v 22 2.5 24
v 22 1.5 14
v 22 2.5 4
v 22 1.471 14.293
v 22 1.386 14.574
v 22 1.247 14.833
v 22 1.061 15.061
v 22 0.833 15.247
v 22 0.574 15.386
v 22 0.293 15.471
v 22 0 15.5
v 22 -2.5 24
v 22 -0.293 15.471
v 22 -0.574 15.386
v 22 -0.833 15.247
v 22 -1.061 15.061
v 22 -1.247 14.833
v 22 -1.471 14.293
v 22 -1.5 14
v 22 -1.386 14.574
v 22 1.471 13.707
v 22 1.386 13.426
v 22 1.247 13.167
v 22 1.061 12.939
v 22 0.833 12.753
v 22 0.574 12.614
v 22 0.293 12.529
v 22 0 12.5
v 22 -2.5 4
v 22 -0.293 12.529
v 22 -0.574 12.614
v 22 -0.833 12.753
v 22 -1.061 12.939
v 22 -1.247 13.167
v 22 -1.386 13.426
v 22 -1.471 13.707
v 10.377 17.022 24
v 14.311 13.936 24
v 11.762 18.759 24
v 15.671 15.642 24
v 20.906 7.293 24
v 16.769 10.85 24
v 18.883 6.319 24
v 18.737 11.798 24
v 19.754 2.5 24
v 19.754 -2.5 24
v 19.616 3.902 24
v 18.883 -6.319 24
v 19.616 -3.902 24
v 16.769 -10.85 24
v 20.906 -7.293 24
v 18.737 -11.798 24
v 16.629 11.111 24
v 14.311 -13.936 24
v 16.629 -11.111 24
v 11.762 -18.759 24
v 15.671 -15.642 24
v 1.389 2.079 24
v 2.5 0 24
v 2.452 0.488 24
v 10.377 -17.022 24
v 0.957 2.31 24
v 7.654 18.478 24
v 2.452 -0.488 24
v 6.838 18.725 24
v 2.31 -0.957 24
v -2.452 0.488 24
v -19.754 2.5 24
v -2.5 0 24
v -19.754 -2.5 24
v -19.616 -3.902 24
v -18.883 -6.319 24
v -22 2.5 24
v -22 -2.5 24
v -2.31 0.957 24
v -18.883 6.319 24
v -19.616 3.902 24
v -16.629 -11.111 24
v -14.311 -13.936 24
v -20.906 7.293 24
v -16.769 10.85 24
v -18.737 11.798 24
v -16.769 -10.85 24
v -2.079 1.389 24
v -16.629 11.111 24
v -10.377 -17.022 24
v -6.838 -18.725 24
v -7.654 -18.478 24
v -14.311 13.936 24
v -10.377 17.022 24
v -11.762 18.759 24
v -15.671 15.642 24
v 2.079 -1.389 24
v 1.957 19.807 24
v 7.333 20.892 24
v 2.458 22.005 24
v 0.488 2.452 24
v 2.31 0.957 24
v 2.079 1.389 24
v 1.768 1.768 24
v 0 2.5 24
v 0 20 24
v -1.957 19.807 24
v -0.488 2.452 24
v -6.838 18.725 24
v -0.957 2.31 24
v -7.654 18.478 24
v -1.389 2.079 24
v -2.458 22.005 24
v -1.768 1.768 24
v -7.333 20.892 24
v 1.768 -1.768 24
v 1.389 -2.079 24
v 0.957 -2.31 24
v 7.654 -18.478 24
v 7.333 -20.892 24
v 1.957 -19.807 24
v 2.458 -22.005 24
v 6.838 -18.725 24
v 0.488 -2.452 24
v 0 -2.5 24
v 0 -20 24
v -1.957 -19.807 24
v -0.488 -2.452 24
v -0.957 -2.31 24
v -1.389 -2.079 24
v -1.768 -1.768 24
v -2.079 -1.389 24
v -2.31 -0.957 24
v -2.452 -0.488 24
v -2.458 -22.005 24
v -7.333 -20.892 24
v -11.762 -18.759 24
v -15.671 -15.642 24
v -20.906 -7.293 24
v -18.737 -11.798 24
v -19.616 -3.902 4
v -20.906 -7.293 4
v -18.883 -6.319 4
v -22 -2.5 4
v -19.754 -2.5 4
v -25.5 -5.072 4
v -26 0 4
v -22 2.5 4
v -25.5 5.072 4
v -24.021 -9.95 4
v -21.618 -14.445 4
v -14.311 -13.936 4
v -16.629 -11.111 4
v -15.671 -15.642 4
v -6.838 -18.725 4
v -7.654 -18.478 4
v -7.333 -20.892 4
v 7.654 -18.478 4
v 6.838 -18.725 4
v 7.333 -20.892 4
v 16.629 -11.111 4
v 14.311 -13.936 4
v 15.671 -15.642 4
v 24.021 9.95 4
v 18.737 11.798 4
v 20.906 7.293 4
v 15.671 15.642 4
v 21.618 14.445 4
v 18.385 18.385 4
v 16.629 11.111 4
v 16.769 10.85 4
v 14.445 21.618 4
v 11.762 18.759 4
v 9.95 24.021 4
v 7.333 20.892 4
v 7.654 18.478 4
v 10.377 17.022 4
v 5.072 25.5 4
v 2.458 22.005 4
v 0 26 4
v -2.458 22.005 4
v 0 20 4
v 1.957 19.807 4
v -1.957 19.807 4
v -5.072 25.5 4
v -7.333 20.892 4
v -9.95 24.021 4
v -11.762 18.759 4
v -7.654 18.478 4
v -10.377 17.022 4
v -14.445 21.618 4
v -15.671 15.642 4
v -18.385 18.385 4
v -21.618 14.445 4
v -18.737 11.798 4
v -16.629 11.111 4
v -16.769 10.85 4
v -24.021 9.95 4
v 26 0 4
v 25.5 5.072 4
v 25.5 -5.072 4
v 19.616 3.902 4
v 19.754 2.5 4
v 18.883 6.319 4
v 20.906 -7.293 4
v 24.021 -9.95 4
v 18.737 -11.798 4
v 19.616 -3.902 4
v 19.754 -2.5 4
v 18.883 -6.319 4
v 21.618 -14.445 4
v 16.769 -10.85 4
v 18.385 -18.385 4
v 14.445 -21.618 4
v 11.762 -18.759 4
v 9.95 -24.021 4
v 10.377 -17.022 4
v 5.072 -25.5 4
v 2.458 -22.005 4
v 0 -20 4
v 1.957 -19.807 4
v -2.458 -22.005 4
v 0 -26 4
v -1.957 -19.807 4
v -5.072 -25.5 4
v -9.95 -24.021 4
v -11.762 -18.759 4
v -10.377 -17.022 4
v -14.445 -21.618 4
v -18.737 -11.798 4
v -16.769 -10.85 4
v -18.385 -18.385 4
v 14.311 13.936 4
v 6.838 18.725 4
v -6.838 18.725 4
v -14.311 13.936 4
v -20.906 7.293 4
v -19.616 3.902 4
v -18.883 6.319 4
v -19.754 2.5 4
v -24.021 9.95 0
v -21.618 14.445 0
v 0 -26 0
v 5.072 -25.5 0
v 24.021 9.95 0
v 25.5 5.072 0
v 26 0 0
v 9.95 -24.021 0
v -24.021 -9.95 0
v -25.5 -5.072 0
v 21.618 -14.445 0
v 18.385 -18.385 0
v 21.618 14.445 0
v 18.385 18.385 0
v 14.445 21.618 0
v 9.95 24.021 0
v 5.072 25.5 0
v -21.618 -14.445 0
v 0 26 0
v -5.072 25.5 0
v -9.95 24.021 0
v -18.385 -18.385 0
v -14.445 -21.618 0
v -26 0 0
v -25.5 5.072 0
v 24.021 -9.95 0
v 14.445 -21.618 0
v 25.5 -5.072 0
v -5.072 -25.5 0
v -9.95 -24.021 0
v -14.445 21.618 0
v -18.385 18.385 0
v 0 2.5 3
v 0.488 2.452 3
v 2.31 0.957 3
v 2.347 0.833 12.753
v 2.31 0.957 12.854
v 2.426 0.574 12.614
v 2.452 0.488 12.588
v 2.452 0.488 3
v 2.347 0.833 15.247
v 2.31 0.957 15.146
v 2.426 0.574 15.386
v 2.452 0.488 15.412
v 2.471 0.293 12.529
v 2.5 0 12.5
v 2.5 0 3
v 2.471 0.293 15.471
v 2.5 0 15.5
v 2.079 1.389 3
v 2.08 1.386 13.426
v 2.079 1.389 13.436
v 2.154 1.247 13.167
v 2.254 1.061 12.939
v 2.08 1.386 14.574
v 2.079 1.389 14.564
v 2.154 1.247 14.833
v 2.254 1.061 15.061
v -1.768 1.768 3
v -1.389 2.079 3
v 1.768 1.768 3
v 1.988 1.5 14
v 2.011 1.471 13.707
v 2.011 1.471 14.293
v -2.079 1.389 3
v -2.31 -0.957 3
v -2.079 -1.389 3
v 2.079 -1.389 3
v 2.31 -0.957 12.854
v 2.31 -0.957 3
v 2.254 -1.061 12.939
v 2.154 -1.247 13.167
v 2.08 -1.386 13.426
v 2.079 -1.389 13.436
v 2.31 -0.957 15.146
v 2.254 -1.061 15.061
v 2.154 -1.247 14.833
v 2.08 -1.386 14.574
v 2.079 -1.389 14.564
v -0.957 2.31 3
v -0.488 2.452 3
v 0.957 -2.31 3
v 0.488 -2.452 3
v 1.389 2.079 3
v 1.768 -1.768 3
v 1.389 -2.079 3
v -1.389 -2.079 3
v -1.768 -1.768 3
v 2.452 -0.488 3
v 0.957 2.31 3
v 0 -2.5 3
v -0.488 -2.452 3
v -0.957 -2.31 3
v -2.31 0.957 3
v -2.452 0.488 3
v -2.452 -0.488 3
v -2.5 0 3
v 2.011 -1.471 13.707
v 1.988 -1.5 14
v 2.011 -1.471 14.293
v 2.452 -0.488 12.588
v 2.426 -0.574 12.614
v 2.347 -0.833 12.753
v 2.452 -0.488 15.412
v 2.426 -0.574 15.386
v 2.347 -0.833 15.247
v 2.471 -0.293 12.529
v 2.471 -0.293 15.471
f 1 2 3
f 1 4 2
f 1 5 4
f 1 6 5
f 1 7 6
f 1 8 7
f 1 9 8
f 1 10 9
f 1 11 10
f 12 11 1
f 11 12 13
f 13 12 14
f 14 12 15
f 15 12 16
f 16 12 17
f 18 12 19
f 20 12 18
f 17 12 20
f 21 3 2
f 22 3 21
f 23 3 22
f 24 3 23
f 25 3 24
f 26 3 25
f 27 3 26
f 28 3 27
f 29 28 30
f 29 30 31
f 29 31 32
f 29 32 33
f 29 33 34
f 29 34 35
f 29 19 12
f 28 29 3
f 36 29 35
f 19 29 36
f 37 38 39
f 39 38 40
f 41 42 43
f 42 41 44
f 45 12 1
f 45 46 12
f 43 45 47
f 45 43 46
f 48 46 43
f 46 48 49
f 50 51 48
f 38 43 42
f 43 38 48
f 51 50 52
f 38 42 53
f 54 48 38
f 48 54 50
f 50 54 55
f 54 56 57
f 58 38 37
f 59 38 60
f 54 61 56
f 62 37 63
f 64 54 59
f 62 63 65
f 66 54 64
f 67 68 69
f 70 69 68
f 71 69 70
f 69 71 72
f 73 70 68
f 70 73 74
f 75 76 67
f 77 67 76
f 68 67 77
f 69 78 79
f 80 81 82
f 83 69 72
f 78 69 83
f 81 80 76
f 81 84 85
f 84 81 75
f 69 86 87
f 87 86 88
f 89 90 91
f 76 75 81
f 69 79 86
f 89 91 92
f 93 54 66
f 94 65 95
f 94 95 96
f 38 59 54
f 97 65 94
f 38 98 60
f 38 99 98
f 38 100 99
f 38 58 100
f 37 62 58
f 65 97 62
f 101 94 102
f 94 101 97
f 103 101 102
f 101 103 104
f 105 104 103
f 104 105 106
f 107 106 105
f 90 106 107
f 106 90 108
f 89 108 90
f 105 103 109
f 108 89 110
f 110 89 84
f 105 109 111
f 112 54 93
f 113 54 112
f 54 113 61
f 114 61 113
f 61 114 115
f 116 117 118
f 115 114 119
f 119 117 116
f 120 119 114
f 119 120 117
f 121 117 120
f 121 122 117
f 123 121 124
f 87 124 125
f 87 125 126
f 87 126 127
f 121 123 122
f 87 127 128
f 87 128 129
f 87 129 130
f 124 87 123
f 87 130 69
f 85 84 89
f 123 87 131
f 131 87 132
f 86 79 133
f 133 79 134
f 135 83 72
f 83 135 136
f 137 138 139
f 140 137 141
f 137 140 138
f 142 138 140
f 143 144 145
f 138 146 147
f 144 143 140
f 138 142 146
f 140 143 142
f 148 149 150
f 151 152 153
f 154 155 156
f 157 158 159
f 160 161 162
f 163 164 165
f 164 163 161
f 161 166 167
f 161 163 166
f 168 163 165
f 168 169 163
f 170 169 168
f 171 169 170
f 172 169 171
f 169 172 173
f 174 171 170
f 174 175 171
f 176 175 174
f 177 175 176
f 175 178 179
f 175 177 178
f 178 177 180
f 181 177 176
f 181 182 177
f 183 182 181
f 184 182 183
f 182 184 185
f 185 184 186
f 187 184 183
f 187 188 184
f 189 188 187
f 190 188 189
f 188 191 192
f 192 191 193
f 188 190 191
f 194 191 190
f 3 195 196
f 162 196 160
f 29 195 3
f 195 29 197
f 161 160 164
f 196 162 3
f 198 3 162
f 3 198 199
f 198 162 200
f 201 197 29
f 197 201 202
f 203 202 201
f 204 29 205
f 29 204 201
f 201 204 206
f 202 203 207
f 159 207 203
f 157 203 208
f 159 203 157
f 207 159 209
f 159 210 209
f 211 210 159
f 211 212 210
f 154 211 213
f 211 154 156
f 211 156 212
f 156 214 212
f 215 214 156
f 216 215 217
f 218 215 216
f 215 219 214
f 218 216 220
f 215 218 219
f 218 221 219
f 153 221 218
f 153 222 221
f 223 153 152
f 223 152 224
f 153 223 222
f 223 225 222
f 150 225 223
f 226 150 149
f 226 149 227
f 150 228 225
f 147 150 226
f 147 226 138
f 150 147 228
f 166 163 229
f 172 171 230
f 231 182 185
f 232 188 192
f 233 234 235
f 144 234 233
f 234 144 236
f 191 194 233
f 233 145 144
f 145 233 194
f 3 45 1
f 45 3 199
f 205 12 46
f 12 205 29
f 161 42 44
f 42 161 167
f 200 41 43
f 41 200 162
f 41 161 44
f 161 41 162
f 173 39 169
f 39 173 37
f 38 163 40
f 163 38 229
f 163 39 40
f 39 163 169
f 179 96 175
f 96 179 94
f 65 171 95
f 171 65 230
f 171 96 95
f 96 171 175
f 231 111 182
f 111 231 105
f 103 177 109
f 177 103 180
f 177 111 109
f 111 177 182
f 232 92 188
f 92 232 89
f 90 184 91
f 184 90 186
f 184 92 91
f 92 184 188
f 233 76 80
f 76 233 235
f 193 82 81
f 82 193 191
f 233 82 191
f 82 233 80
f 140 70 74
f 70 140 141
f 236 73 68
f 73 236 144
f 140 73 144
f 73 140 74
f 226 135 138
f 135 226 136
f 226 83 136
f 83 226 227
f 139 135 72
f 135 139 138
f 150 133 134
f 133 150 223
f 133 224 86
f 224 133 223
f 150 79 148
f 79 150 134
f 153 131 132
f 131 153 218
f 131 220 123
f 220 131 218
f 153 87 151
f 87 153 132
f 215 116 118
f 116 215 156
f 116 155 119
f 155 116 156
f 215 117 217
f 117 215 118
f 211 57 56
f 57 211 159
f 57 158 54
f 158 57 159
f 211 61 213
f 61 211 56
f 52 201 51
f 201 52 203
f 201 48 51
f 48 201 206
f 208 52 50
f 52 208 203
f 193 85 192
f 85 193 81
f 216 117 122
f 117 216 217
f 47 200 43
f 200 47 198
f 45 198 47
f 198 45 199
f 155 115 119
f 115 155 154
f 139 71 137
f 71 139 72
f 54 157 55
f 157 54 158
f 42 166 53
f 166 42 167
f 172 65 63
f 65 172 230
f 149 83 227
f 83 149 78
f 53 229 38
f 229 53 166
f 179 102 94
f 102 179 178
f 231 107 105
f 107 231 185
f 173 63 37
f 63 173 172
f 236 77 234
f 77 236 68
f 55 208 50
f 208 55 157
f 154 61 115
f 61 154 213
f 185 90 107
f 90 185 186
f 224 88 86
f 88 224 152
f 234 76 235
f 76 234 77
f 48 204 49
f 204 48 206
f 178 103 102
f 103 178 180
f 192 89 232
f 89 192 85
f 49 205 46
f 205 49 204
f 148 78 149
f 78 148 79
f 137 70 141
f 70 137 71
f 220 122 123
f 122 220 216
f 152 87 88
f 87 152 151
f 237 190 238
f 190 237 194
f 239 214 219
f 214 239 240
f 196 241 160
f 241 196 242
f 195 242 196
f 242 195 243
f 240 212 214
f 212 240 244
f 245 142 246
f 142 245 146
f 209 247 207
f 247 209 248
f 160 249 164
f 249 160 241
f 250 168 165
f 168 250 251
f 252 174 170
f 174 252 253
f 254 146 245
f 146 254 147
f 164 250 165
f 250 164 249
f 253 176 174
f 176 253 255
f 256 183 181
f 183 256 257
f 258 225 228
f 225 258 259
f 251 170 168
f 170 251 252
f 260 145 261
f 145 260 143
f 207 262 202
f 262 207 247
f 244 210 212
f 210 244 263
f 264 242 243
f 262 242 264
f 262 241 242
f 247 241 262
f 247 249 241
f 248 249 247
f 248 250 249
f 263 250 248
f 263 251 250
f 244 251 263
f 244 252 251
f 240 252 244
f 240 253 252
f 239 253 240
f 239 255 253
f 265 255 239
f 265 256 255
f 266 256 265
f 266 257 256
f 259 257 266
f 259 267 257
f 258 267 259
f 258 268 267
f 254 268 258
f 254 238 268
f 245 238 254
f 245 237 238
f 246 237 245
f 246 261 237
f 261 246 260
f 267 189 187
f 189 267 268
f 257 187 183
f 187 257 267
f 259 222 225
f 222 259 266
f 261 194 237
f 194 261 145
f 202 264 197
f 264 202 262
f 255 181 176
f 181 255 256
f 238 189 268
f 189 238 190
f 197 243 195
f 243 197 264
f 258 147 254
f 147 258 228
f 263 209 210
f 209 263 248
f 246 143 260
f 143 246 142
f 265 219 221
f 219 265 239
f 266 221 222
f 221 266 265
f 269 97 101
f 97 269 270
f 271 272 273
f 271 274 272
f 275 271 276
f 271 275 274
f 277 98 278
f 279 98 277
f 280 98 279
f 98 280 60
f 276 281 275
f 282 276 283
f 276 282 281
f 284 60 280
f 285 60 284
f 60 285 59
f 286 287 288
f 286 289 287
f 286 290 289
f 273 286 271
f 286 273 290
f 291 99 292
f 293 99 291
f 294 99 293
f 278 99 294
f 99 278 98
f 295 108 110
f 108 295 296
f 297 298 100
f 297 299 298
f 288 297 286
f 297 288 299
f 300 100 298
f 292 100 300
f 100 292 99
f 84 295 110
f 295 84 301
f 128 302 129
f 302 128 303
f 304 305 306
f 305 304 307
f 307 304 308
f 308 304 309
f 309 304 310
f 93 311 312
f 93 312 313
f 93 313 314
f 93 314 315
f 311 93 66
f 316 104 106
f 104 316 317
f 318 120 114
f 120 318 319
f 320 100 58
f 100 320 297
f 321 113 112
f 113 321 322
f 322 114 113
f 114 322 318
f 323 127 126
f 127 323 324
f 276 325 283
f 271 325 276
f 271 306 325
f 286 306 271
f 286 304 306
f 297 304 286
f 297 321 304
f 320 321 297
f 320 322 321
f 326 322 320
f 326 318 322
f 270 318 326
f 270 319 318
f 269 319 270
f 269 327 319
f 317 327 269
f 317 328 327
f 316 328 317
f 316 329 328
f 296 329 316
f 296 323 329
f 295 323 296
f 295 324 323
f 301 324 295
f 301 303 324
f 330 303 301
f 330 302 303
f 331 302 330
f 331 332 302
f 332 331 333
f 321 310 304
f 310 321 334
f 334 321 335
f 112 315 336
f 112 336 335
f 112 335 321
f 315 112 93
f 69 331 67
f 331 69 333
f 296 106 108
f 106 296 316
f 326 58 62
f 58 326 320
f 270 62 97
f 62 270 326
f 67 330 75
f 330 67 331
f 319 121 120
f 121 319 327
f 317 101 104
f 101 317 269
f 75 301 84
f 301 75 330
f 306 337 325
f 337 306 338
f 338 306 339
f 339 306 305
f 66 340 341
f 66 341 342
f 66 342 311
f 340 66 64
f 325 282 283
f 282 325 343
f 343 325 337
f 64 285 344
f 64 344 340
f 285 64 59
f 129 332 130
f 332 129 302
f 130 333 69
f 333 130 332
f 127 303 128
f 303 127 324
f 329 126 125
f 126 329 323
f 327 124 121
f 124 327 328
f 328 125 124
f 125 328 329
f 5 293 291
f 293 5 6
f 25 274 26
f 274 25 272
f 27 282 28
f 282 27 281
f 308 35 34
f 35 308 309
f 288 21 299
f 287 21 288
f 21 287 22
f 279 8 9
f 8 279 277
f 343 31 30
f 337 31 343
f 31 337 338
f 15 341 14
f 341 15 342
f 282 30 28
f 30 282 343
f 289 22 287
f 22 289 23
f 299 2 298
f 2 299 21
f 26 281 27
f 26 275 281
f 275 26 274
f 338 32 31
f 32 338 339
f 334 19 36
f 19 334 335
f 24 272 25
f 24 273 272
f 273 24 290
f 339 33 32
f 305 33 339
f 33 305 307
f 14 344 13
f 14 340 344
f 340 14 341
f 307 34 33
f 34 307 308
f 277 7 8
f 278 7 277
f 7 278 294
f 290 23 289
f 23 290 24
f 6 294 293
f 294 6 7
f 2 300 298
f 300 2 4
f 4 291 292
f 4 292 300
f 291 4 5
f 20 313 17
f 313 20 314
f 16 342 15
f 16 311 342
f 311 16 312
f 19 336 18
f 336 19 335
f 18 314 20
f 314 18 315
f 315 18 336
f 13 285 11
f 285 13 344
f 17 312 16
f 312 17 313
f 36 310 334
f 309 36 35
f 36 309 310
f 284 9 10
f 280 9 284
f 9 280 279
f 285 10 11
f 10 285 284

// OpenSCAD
$fn = 32;

// ----------------------------------------------------------------------
// Control knob: skirt knob with grip ribs
// ----------------------------------------------------------------------

// --- parameters (mm) ---
skirt_d = 52;             // skirt diameter
skirt_t = 4;              // skirt thickness
rib_w = 5;                // grip rib width
rib_out = 3;              // grip rib radial protrusion
n_ribs = 14;              // number of grip ribs
knob_d = 40;              // knob body diameter
knob_h = 20;              // knob body height
bore_d = 5;               // shaft bore diameter
set_d = 3;                // set screw bore diameter

rib_step = 360 / n_ribs;  // rib angular step
total_h = skirt_t + knob_h;  // overall height

difference() {
  union() {
    translate([0, 0, skirt_t]) cylinder(h = knob_h, d = knob_d);
    cylinder(h = skirt_t, d = skirt_d);
    for (i = [0 : n_ribs - 1])
      rotate([0, 0, i * rib_step])
        translate([knob_d / 2 - 1, -rib_w / 2, skirt_t])
          cube([rib_out, rib_w, knob_h]);
  }
  translate([0, 0, skirt_t - 1]) cylinder(h = knob_h + 2, d = bore_d);
  translate([-1, 0, skirt_t + knob_h / 2]) rotate([0, 90, 0])
    cylinder(h = knob_d / 2 + bore_d / 2 + 2, d = set_d);
}
